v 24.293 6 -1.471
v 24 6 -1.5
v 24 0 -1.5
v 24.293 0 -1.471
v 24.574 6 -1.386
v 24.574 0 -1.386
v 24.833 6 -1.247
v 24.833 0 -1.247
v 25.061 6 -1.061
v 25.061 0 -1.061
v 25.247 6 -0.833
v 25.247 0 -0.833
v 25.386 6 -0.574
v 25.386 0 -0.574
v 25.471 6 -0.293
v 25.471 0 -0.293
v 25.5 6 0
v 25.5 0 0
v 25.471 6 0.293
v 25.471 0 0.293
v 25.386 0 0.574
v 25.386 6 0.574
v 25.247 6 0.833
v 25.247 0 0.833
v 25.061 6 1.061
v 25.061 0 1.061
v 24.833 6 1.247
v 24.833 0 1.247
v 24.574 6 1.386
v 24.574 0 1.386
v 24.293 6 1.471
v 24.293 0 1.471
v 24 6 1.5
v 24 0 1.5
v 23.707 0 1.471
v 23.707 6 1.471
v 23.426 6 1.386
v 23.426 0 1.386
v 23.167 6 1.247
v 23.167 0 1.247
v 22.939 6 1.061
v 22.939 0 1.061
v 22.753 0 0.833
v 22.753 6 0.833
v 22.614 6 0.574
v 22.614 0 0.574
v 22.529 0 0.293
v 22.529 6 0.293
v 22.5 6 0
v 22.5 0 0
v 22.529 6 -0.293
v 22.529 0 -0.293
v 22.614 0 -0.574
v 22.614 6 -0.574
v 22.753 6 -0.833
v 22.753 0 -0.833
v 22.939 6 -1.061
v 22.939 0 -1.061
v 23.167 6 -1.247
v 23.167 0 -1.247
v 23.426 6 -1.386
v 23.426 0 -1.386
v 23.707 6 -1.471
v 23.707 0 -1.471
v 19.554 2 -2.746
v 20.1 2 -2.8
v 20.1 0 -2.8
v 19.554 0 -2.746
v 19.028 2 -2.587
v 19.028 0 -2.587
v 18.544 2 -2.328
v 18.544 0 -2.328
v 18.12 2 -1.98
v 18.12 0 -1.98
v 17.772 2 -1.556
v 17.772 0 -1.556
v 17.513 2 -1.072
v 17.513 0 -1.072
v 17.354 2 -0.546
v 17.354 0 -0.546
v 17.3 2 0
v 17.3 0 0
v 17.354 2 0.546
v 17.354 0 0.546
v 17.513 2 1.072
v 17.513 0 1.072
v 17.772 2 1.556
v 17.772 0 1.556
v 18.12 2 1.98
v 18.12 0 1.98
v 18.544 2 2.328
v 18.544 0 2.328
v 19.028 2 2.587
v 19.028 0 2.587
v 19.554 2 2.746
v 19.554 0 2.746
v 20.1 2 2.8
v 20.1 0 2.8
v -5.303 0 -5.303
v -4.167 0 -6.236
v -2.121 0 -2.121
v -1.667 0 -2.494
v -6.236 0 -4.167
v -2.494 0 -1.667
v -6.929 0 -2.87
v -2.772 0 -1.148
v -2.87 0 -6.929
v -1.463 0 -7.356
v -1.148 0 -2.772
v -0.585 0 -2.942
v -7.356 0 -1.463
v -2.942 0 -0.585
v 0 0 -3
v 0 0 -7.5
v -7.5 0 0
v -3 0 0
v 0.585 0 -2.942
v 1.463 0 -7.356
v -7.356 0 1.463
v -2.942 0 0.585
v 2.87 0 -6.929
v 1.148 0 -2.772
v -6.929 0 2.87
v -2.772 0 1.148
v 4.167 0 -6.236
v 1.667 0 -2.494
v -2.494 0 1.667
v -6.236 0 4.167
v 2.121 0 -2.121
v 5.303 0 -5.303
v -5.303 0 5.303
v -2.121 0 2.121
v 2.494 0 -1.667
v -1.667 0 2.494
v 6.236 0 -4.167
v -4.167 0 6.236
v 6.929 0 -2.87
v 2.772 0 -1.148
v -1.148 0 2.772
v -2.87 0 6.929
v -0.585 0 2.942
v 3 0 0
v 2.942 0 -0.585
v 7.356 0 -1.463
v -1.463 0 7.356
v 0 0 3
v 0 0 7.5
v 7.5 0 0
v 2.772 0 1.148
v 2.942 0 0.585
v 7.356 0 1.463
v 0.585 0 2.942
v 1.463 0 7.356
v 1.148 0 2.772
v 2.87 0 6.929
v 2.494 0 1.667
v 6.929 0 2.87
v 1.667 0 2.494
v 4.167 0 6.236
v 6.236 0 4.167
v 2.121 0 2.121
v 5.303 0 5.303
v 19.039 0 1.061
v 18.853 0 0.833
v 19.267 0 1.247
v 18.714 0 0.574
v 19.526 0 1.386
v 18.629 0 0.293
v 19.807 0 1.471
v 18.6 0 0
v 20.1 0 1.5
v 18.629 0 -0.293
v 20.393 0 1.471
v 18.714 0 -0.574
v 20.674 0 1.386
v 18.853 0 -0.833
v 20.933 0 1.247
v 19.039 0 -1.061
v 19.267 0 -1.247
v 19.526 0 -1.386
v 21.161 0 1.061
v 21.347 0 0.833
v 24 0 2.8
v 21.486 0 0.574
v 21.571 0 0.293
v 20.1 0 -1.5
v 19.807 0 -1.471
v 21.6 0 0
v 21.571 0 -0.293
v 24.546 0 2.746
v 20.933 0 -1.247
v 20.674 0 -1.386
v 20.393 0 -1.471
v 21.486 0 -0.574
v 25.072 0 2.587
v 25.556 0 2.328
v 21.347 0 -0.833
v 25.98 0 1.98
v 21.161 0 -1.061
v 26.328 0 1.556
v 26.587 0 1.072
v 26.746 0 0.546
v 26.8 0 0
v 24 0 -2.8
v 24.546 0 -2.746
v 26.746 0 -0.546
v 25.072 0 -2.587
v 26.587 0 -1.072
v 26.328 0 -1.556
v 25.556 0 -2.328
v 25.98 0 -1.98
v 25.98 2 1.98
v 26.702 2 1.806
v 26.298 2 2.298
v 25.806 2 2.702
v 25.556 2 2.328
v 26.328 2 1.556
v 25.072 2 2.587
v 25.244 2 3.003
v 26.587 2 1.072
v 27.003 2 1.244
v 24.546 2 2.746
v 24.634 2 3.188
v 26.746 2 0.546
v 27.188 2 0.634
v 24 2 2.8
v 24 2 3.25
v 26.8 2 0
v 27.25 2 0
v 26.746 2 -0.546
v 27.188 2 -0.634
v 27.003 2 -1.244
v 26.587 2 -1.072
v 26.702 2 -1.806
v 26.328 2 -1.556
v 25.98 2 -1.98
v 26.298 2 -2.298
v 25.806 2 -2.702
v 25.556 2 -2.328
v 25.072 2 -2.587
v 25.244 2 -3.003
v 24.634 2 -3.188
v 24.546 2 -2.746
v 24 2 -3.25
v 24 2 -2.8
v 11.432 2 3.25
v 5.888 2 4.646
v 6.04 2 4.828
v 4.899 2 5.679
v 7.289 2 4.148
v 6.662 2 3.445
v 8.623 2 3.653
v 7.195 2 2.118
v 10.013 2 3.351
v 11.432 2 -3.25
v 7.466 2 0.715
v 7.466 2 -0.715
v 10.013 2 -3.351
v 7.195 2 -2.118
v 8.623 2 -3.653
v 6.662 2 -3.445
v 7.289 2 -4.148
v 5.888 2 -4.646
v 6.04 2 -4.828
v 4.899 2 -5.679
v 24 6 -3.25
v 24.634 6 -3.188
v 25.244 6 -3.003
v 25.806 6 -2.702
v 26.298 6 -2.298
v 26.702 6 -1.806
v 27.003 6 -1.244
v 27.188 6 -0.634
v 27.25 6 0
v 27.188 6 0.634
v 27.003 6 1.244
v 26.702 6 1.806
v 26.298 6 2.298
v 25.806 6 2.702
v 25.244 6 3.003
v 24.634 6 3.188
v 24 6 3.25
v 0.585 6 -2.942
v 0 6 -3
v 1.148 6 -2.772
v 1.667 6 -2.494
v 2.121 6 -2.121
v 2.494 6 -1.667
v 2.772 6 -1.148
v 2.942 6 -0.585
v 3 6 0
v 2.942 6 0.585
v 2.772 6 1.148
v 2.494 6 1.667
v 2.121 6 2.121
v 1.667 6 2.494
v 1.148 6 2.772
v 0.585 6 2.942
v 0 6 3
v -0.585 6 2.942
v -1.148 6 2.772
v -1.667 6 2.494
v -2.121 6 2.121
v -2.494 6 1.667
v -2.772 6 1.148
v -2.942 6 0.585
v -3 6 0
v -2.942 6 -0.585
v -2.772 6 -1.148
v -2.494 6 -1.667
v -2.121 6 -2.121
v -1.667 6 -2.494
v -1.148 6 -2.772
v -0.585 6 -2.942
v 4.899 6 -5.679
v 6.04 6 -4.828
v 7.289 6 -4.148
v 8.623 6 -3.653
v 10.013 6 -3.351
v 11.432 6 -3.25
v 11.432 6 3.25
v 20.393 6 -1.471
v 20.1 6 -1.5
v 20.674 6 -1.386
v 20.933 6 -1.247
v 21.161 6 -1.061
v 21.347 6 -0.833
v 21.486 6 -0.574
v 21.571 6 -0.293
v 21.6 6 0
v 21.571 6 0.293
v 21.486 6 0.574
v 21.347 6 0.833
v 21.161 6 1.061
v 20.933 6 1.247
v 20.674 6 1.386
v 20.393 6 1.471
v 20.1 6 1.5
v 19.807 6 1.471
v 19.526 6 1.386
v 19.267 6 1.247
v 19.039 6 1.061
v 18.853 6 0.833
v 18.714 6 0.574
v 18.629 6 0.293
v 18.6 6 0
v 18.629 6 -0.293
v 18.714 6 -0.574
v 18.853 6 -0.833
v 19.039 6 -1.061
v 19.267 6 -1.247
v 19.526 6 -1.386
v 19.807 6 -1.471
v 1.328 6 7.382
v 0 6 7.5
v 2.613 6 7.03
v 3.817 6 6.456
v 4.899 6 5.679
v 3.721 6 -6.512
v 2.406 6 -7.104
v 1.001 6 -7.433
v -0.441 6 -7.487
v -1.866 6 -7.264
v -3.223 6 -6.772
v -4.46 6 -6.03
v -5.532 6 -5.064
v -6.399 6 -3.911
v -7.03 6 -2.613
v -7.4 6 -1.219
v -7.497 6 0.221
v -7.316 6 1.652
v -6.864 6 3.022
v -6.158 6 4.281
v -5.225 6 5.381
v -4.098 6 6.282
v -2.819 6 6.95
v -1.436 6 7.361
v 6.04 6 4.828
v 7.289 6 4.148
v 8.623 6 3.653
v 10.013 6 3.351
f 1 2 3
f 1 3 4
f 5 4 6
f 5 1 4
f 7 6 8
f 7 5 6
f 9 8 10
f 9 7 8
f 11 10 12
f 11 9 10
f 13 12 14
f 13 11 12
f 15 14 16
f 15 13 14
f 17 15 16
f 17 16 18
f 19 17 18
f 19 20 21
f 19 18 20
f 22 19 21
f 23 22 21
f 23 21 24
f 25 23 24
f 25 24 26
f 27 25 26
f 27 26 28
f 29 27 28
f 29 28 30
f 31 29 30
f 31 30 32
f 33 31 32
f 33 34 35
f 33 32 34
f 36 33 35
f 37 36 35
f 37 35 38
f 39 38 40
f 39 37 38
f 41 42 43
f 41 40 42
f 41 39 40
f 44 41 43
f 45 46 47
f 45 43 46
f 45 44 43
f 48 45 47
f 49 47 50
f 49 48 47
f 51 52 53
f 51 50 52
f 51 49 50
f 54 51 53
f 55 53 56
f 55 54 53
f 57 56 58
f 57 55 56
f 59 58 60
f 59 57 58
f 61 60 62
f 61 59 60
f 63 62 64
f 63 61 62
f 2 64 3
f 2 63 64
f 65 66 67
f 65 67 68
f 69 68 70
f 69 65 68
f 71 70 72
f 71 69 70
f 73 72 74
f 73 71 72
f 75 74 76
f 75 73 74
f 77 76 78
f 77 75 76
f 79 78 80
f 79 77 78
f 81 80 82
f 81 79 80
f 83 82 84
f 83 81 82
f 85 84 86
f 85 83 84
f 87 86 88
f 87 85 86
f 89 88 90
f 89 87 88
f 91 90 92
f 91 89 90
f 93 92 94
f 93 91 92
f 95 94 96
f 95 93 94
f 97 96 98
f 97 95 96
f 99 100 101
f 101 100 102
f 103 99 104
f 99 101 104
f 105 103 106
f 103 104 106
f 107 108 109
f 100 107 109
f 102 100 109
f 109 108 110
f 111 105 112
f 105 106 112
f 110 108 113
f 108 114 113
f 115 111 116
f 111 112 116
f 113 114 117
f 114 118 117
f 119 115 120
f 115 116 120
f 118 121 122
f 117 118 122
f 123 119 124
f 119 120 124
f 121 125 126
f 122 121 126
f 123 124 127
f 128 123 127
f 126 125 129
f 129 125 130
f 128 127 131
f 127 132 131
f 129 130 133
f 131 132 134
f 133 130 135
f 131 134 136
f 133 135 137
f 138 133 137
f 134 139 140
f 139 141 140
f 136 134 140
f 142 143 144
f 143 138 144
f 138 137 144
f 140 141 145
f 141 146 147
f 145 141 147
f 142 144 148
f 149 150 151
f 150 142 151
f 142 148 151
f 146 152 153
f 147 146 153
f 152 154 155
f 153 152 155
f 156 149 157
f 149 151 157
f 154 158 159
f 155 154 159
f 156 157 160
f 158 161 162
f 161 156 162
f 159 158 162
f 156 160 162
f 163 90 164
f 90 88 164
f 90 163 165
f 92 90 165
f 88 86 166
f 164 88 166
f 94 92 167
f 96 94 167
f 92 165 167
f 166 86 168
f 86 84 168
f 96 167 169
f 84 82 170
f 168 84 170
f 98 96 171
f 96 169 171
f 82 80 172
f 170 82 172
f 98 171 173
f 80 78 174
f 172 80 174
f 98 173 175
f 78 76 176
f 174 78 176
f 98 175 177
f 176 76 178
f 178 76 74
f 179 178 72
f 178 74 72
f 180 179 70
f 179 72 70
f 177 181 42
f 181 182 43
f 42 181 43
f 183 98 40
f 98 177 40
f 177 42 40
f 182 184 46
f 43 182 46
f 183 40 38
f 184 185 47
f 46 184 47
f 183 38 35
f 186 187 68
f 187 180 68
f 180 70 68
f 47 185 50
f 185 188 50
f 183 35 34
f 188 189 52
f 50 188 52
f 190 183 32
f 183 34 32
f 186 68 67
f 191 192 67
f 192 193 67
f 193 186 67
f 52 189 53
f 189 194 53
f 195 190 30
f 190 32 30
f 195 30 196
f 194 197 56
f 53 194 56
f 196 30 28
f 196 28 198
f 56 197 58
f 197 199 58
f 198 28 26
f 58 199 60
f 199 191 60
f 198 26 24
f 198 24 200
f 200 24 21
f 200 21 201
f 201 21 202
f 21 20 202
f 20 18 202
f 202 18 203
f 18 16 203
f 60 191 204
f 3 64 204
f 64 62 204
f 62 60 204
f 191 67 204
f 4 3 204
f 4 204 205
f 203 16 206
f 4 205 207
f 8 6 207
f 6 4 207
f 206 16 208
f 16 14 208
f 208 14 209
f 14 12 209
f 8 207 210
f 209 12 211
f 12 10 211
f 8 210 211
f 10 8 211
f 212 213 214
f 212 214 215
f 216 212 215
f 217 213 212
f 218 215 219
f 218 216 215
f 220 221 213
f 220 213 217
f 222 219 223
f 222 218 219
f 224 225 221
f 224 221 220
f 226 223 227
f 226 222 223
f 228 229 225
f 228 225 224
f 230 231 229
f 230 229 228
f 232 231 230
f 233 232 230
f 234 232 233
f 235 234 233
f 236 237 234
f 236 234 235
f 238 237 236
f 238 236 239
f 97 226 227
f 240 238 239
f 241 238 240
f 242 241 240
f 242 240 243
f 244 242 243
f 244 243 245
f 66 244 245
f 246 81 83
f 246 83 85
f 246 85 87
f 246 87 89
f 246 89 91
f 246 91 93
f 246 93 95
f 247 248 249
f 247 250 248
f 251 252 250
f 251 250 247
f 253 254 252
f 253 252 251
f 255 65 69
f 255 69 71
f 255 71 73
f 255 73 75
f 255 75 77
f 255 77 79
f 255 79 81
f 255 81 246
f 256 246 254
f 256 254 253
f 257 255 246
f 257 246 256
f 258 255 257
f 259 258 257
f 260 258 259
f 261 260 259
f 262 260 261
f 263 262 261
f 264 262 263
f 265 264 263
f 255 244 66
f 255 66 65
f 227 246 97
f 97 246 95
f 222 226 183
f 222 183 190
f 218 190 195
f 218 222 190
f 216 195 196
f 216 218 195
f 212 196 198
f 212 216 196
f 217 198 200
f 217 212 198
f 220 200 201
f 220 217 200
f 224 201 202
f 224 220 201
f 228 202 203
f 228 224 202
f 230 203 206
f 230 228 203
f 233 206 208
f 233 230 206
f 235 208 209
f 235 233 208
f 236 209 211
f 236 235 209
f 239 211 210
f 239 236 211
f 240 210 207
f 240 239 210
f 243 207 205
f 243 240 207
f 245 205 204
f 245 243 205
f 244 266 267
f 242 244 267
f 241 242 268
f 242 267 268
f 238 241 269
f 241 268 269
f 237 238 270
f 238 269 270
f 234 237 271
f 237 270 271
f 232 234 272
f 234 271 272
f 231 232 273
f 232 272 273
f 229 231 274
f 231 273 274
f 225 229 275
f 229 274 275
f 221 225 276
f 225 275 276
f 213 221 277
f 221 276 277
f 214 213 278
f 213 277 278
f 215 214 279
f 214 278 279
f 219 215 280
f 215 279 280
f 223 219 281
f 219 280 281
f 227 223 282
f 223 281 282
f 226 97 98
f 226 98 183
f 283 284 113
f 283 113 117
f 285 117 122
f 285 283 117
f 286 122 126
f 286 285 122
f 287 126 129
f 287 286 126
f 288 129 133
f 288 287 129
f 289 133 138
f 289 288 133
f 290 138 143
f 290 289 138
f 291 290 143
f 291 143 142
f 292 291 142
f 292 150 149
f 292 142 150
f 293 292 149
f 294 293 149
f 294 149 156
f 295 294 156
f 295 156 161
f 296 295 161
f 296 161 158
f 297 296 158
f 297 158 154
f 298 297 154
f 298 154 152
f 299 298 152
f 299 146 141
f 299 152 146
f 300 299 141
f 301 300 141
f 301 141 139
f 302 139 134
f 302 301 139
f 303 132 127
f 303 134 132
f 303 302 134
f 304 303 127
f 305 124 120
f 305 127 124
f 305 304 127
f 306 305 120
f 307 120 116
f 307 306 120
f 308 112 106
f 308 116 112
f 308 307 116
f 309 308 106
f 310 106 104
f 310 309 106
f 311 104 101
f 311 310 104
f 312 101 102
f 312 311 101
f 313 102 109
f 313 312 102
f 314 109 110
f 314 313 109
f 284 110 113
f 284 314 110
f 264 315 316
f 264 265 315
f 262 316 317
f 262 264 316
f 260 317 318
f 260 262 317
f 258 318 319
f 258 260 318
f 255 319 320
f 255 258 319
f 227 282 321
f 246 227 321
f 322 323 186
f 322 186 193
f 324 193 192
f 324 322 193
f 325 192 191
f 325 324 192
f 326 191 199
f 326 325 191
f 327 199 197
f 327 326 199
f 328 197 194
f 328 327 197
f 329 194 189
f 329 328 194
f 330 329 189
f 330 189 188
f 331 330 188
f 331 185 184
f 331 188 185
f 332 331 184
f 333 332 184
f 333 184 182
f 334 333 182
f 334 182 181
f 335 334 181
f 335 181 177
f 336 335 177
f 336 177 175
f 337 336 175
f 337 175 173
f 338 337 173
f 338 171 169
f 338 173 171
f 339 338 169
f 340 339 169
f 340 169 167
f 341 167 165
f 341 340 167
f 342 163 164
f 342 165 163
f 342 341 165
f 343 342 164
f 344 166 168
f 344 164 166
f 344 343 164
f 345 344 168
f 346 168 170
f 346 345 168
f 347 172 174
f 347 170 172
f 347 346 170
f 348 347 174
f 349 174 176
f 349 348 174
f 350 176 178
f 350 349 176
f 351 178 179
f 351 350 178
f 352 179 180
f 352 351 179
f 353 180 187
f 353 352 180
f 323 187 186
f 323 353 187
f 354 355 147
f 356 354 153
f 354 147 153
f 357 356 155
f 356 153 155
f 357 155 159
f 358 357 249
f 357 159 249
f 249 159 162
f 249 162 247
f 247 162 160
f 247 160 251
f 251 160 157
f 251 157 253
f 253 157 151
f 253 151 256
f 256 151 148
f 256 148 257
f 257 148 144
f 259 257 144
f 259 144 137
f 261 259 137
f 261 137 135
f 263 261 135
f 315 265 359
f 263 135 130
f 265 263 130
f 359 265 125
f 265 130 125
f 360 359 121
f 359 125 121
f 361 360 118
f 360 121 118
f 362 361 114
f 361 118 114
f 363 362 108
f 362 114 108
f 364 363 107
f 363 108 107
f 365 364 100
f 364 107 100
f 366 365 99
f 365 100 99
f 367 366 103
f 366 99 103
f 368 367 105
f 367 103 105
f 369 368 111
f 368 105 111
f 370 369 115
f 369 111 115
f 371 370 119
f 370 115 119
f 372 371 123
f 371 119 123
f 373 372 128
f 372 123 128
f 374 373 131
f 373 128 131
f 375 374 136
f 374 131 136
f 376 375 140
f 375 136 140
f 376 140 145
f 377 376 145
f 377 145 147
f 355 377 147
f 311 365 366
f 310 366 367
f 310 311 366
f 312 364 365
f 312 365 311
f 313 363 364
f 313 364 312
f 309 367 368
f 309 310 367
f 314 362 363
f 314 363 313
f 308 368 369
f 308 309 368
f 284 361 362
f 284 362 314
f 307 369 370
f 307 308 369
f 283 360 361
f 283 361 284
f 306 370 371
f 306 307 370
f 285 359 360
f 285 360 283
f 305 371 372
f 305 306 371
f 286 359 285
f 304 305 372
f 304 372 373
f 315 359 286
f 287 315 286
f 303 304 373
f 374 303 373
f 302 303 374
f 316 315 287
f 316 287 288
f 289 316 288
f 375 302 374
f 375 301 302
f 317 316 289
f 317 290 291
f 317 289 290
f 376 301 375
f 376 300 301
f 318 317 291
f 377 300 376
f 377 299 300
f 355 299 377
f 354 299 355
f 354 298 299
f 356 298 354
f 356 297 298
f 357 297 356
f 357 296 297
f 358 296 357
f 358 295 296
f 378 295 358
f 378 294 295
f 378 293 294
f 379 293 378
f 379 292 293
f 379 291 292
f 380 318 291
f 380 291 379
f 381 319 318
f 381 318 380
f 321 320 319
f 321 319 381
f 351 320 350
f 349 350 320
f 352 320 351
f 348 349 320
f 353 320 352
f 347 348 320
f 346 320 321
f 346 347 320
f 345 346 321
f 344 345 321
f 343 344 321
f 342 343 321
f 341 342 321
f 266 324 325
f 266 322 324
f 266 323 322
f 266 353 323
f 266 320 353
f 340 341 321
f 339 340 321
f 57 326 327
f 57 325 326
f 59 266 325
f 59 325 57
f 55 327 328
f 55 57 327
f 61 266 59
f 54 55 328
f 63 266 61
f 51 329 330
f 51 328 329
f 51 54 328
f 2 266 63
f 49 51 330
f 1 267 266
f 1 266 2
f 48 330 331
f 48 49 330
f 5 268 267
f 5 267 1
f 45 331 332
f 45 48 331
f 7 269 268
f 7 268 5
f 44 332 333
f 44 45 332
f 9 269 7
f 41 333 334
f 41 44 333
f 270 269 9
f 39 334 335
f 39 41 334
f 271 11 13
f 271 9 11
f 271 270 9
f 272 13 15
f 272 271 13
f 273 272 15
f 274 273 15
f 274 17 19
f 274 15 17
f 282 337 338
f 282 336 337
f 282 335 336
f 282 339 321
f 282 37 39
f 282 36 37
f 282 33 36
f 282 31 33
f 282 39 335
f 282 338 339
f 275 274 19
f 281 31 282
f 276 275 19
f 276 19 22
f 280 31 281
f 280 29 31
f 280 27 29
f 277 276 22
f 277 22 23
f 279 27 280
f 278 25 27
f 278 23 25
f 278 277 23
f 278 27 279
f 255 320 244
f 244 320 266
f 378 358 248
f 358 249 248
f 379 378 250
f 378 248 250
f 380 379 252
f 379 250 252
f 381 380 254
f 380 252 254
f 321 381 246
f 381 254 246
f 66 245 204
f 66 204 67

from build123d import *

# Parameters (mm, degrees)
SKETCH1_R               = 7.5
BOSS_EXTRUDE1_DEPTH     = 6
BOSS_EXTRUDE2_DEPTH     = 4
BOSS_EXTRUDE3_DEPTH     = 2
CUT_EXTRUDE1_DEPTH      = 29.893122019
CUT_EXTRUDE1_DEPTH_BACK = 29.893122019
SKETCH5_R               = 1.5
SKETCH5_R_2             = 3
FILLET1_R               = 10


with BuildPart() as part:
    # Sketch1 → Boss-Extrude1 (new body)
    with BuildSketch(Plane(origin=(0, 0, 0), x_dir=(1, 0, 0), z_dir=(0, 1, 0))):
        with Locations(Location((0, 0, 0), (0, 0, 270))):
            Circle(SKETCH1_R)
    extrude(amount=BOSS_EXTRUDE1_DEPTH)

    # Sketch2 → Boss-Extrude2 (add)
    with BuildSketch(Plane(origin=(0, 6, 0), x_dir=(1, 0, 0), z_dir=(0, 1, 0))):
        with BuildLine():
            Line((0, 3.25), (24, 3.25))
            ThreePointArc((24, 3.25), (27.25, 0), (24, -3.25))
            Line((24, -3.25), (0, -3.25))
            ThreePointArc((0, -3.25), (-3.25, 0), (0, 3.25))
        make_face()
    extrude(amount=-BOSS_EXTRUDE2_DEPTH)

    # Sketch4 → Boss-Extrude3 (add)
    with BuildSketch(Plane(origin=(0, 2, 0), x_dir=(-1, 0, 0), z_dir=(0, -1, 0))):
        with BuildLine():
            Line((-24, 2.8), (-20.1, 2.8))
            ThreePointArc((-20.1, 2.8), (-17.3, 0), (-20.1, -2.8))
            Line((-20.1, -2.8), (-24, -2.8))
            ThreePointArc((-24, -2.8), (-26.8, 0), (-24, 2.8))
        make_face()
    extrude(amount=BOSS_EXTRUDE3_DEPTH)

    # Sketch5 → Cut-Extrude1 (cut, two sides: drawn at the far end of the back side and taken through both)
    with BuildSketch(Plane.XZ.offset(-CUT_EXTRUDE1_DEPTH_BACK)):
        with Locations(Location((24, 0, 0), (0, 0, 270))):
            Circle(SKETCH5_R)
        with Locations(Location((20.1, 0, 0), (0, 0, 270))):
            Circle(SKETCH5_R)
        with Locations(Location((0, 0, 0), (0, 0, 270))):
            Circle(SKETCH5_R_2)
    extrude(amount=CUT_EXTRUDE1_DEPTH + CUT_EXTRUDE1_DEPTH_BACK, mode=Mode.SUBTRACT)

    # Fillet1
    fillet1_edges = [part.edges().sort_by_distance(p)[0] for p in [
        (6.759252917, 4, -3.25),
        (6.759252917, 4, 3.25),
    ]]
    fillet(fillet1_edges, radius=FILLET1_R)


solid = part.part
